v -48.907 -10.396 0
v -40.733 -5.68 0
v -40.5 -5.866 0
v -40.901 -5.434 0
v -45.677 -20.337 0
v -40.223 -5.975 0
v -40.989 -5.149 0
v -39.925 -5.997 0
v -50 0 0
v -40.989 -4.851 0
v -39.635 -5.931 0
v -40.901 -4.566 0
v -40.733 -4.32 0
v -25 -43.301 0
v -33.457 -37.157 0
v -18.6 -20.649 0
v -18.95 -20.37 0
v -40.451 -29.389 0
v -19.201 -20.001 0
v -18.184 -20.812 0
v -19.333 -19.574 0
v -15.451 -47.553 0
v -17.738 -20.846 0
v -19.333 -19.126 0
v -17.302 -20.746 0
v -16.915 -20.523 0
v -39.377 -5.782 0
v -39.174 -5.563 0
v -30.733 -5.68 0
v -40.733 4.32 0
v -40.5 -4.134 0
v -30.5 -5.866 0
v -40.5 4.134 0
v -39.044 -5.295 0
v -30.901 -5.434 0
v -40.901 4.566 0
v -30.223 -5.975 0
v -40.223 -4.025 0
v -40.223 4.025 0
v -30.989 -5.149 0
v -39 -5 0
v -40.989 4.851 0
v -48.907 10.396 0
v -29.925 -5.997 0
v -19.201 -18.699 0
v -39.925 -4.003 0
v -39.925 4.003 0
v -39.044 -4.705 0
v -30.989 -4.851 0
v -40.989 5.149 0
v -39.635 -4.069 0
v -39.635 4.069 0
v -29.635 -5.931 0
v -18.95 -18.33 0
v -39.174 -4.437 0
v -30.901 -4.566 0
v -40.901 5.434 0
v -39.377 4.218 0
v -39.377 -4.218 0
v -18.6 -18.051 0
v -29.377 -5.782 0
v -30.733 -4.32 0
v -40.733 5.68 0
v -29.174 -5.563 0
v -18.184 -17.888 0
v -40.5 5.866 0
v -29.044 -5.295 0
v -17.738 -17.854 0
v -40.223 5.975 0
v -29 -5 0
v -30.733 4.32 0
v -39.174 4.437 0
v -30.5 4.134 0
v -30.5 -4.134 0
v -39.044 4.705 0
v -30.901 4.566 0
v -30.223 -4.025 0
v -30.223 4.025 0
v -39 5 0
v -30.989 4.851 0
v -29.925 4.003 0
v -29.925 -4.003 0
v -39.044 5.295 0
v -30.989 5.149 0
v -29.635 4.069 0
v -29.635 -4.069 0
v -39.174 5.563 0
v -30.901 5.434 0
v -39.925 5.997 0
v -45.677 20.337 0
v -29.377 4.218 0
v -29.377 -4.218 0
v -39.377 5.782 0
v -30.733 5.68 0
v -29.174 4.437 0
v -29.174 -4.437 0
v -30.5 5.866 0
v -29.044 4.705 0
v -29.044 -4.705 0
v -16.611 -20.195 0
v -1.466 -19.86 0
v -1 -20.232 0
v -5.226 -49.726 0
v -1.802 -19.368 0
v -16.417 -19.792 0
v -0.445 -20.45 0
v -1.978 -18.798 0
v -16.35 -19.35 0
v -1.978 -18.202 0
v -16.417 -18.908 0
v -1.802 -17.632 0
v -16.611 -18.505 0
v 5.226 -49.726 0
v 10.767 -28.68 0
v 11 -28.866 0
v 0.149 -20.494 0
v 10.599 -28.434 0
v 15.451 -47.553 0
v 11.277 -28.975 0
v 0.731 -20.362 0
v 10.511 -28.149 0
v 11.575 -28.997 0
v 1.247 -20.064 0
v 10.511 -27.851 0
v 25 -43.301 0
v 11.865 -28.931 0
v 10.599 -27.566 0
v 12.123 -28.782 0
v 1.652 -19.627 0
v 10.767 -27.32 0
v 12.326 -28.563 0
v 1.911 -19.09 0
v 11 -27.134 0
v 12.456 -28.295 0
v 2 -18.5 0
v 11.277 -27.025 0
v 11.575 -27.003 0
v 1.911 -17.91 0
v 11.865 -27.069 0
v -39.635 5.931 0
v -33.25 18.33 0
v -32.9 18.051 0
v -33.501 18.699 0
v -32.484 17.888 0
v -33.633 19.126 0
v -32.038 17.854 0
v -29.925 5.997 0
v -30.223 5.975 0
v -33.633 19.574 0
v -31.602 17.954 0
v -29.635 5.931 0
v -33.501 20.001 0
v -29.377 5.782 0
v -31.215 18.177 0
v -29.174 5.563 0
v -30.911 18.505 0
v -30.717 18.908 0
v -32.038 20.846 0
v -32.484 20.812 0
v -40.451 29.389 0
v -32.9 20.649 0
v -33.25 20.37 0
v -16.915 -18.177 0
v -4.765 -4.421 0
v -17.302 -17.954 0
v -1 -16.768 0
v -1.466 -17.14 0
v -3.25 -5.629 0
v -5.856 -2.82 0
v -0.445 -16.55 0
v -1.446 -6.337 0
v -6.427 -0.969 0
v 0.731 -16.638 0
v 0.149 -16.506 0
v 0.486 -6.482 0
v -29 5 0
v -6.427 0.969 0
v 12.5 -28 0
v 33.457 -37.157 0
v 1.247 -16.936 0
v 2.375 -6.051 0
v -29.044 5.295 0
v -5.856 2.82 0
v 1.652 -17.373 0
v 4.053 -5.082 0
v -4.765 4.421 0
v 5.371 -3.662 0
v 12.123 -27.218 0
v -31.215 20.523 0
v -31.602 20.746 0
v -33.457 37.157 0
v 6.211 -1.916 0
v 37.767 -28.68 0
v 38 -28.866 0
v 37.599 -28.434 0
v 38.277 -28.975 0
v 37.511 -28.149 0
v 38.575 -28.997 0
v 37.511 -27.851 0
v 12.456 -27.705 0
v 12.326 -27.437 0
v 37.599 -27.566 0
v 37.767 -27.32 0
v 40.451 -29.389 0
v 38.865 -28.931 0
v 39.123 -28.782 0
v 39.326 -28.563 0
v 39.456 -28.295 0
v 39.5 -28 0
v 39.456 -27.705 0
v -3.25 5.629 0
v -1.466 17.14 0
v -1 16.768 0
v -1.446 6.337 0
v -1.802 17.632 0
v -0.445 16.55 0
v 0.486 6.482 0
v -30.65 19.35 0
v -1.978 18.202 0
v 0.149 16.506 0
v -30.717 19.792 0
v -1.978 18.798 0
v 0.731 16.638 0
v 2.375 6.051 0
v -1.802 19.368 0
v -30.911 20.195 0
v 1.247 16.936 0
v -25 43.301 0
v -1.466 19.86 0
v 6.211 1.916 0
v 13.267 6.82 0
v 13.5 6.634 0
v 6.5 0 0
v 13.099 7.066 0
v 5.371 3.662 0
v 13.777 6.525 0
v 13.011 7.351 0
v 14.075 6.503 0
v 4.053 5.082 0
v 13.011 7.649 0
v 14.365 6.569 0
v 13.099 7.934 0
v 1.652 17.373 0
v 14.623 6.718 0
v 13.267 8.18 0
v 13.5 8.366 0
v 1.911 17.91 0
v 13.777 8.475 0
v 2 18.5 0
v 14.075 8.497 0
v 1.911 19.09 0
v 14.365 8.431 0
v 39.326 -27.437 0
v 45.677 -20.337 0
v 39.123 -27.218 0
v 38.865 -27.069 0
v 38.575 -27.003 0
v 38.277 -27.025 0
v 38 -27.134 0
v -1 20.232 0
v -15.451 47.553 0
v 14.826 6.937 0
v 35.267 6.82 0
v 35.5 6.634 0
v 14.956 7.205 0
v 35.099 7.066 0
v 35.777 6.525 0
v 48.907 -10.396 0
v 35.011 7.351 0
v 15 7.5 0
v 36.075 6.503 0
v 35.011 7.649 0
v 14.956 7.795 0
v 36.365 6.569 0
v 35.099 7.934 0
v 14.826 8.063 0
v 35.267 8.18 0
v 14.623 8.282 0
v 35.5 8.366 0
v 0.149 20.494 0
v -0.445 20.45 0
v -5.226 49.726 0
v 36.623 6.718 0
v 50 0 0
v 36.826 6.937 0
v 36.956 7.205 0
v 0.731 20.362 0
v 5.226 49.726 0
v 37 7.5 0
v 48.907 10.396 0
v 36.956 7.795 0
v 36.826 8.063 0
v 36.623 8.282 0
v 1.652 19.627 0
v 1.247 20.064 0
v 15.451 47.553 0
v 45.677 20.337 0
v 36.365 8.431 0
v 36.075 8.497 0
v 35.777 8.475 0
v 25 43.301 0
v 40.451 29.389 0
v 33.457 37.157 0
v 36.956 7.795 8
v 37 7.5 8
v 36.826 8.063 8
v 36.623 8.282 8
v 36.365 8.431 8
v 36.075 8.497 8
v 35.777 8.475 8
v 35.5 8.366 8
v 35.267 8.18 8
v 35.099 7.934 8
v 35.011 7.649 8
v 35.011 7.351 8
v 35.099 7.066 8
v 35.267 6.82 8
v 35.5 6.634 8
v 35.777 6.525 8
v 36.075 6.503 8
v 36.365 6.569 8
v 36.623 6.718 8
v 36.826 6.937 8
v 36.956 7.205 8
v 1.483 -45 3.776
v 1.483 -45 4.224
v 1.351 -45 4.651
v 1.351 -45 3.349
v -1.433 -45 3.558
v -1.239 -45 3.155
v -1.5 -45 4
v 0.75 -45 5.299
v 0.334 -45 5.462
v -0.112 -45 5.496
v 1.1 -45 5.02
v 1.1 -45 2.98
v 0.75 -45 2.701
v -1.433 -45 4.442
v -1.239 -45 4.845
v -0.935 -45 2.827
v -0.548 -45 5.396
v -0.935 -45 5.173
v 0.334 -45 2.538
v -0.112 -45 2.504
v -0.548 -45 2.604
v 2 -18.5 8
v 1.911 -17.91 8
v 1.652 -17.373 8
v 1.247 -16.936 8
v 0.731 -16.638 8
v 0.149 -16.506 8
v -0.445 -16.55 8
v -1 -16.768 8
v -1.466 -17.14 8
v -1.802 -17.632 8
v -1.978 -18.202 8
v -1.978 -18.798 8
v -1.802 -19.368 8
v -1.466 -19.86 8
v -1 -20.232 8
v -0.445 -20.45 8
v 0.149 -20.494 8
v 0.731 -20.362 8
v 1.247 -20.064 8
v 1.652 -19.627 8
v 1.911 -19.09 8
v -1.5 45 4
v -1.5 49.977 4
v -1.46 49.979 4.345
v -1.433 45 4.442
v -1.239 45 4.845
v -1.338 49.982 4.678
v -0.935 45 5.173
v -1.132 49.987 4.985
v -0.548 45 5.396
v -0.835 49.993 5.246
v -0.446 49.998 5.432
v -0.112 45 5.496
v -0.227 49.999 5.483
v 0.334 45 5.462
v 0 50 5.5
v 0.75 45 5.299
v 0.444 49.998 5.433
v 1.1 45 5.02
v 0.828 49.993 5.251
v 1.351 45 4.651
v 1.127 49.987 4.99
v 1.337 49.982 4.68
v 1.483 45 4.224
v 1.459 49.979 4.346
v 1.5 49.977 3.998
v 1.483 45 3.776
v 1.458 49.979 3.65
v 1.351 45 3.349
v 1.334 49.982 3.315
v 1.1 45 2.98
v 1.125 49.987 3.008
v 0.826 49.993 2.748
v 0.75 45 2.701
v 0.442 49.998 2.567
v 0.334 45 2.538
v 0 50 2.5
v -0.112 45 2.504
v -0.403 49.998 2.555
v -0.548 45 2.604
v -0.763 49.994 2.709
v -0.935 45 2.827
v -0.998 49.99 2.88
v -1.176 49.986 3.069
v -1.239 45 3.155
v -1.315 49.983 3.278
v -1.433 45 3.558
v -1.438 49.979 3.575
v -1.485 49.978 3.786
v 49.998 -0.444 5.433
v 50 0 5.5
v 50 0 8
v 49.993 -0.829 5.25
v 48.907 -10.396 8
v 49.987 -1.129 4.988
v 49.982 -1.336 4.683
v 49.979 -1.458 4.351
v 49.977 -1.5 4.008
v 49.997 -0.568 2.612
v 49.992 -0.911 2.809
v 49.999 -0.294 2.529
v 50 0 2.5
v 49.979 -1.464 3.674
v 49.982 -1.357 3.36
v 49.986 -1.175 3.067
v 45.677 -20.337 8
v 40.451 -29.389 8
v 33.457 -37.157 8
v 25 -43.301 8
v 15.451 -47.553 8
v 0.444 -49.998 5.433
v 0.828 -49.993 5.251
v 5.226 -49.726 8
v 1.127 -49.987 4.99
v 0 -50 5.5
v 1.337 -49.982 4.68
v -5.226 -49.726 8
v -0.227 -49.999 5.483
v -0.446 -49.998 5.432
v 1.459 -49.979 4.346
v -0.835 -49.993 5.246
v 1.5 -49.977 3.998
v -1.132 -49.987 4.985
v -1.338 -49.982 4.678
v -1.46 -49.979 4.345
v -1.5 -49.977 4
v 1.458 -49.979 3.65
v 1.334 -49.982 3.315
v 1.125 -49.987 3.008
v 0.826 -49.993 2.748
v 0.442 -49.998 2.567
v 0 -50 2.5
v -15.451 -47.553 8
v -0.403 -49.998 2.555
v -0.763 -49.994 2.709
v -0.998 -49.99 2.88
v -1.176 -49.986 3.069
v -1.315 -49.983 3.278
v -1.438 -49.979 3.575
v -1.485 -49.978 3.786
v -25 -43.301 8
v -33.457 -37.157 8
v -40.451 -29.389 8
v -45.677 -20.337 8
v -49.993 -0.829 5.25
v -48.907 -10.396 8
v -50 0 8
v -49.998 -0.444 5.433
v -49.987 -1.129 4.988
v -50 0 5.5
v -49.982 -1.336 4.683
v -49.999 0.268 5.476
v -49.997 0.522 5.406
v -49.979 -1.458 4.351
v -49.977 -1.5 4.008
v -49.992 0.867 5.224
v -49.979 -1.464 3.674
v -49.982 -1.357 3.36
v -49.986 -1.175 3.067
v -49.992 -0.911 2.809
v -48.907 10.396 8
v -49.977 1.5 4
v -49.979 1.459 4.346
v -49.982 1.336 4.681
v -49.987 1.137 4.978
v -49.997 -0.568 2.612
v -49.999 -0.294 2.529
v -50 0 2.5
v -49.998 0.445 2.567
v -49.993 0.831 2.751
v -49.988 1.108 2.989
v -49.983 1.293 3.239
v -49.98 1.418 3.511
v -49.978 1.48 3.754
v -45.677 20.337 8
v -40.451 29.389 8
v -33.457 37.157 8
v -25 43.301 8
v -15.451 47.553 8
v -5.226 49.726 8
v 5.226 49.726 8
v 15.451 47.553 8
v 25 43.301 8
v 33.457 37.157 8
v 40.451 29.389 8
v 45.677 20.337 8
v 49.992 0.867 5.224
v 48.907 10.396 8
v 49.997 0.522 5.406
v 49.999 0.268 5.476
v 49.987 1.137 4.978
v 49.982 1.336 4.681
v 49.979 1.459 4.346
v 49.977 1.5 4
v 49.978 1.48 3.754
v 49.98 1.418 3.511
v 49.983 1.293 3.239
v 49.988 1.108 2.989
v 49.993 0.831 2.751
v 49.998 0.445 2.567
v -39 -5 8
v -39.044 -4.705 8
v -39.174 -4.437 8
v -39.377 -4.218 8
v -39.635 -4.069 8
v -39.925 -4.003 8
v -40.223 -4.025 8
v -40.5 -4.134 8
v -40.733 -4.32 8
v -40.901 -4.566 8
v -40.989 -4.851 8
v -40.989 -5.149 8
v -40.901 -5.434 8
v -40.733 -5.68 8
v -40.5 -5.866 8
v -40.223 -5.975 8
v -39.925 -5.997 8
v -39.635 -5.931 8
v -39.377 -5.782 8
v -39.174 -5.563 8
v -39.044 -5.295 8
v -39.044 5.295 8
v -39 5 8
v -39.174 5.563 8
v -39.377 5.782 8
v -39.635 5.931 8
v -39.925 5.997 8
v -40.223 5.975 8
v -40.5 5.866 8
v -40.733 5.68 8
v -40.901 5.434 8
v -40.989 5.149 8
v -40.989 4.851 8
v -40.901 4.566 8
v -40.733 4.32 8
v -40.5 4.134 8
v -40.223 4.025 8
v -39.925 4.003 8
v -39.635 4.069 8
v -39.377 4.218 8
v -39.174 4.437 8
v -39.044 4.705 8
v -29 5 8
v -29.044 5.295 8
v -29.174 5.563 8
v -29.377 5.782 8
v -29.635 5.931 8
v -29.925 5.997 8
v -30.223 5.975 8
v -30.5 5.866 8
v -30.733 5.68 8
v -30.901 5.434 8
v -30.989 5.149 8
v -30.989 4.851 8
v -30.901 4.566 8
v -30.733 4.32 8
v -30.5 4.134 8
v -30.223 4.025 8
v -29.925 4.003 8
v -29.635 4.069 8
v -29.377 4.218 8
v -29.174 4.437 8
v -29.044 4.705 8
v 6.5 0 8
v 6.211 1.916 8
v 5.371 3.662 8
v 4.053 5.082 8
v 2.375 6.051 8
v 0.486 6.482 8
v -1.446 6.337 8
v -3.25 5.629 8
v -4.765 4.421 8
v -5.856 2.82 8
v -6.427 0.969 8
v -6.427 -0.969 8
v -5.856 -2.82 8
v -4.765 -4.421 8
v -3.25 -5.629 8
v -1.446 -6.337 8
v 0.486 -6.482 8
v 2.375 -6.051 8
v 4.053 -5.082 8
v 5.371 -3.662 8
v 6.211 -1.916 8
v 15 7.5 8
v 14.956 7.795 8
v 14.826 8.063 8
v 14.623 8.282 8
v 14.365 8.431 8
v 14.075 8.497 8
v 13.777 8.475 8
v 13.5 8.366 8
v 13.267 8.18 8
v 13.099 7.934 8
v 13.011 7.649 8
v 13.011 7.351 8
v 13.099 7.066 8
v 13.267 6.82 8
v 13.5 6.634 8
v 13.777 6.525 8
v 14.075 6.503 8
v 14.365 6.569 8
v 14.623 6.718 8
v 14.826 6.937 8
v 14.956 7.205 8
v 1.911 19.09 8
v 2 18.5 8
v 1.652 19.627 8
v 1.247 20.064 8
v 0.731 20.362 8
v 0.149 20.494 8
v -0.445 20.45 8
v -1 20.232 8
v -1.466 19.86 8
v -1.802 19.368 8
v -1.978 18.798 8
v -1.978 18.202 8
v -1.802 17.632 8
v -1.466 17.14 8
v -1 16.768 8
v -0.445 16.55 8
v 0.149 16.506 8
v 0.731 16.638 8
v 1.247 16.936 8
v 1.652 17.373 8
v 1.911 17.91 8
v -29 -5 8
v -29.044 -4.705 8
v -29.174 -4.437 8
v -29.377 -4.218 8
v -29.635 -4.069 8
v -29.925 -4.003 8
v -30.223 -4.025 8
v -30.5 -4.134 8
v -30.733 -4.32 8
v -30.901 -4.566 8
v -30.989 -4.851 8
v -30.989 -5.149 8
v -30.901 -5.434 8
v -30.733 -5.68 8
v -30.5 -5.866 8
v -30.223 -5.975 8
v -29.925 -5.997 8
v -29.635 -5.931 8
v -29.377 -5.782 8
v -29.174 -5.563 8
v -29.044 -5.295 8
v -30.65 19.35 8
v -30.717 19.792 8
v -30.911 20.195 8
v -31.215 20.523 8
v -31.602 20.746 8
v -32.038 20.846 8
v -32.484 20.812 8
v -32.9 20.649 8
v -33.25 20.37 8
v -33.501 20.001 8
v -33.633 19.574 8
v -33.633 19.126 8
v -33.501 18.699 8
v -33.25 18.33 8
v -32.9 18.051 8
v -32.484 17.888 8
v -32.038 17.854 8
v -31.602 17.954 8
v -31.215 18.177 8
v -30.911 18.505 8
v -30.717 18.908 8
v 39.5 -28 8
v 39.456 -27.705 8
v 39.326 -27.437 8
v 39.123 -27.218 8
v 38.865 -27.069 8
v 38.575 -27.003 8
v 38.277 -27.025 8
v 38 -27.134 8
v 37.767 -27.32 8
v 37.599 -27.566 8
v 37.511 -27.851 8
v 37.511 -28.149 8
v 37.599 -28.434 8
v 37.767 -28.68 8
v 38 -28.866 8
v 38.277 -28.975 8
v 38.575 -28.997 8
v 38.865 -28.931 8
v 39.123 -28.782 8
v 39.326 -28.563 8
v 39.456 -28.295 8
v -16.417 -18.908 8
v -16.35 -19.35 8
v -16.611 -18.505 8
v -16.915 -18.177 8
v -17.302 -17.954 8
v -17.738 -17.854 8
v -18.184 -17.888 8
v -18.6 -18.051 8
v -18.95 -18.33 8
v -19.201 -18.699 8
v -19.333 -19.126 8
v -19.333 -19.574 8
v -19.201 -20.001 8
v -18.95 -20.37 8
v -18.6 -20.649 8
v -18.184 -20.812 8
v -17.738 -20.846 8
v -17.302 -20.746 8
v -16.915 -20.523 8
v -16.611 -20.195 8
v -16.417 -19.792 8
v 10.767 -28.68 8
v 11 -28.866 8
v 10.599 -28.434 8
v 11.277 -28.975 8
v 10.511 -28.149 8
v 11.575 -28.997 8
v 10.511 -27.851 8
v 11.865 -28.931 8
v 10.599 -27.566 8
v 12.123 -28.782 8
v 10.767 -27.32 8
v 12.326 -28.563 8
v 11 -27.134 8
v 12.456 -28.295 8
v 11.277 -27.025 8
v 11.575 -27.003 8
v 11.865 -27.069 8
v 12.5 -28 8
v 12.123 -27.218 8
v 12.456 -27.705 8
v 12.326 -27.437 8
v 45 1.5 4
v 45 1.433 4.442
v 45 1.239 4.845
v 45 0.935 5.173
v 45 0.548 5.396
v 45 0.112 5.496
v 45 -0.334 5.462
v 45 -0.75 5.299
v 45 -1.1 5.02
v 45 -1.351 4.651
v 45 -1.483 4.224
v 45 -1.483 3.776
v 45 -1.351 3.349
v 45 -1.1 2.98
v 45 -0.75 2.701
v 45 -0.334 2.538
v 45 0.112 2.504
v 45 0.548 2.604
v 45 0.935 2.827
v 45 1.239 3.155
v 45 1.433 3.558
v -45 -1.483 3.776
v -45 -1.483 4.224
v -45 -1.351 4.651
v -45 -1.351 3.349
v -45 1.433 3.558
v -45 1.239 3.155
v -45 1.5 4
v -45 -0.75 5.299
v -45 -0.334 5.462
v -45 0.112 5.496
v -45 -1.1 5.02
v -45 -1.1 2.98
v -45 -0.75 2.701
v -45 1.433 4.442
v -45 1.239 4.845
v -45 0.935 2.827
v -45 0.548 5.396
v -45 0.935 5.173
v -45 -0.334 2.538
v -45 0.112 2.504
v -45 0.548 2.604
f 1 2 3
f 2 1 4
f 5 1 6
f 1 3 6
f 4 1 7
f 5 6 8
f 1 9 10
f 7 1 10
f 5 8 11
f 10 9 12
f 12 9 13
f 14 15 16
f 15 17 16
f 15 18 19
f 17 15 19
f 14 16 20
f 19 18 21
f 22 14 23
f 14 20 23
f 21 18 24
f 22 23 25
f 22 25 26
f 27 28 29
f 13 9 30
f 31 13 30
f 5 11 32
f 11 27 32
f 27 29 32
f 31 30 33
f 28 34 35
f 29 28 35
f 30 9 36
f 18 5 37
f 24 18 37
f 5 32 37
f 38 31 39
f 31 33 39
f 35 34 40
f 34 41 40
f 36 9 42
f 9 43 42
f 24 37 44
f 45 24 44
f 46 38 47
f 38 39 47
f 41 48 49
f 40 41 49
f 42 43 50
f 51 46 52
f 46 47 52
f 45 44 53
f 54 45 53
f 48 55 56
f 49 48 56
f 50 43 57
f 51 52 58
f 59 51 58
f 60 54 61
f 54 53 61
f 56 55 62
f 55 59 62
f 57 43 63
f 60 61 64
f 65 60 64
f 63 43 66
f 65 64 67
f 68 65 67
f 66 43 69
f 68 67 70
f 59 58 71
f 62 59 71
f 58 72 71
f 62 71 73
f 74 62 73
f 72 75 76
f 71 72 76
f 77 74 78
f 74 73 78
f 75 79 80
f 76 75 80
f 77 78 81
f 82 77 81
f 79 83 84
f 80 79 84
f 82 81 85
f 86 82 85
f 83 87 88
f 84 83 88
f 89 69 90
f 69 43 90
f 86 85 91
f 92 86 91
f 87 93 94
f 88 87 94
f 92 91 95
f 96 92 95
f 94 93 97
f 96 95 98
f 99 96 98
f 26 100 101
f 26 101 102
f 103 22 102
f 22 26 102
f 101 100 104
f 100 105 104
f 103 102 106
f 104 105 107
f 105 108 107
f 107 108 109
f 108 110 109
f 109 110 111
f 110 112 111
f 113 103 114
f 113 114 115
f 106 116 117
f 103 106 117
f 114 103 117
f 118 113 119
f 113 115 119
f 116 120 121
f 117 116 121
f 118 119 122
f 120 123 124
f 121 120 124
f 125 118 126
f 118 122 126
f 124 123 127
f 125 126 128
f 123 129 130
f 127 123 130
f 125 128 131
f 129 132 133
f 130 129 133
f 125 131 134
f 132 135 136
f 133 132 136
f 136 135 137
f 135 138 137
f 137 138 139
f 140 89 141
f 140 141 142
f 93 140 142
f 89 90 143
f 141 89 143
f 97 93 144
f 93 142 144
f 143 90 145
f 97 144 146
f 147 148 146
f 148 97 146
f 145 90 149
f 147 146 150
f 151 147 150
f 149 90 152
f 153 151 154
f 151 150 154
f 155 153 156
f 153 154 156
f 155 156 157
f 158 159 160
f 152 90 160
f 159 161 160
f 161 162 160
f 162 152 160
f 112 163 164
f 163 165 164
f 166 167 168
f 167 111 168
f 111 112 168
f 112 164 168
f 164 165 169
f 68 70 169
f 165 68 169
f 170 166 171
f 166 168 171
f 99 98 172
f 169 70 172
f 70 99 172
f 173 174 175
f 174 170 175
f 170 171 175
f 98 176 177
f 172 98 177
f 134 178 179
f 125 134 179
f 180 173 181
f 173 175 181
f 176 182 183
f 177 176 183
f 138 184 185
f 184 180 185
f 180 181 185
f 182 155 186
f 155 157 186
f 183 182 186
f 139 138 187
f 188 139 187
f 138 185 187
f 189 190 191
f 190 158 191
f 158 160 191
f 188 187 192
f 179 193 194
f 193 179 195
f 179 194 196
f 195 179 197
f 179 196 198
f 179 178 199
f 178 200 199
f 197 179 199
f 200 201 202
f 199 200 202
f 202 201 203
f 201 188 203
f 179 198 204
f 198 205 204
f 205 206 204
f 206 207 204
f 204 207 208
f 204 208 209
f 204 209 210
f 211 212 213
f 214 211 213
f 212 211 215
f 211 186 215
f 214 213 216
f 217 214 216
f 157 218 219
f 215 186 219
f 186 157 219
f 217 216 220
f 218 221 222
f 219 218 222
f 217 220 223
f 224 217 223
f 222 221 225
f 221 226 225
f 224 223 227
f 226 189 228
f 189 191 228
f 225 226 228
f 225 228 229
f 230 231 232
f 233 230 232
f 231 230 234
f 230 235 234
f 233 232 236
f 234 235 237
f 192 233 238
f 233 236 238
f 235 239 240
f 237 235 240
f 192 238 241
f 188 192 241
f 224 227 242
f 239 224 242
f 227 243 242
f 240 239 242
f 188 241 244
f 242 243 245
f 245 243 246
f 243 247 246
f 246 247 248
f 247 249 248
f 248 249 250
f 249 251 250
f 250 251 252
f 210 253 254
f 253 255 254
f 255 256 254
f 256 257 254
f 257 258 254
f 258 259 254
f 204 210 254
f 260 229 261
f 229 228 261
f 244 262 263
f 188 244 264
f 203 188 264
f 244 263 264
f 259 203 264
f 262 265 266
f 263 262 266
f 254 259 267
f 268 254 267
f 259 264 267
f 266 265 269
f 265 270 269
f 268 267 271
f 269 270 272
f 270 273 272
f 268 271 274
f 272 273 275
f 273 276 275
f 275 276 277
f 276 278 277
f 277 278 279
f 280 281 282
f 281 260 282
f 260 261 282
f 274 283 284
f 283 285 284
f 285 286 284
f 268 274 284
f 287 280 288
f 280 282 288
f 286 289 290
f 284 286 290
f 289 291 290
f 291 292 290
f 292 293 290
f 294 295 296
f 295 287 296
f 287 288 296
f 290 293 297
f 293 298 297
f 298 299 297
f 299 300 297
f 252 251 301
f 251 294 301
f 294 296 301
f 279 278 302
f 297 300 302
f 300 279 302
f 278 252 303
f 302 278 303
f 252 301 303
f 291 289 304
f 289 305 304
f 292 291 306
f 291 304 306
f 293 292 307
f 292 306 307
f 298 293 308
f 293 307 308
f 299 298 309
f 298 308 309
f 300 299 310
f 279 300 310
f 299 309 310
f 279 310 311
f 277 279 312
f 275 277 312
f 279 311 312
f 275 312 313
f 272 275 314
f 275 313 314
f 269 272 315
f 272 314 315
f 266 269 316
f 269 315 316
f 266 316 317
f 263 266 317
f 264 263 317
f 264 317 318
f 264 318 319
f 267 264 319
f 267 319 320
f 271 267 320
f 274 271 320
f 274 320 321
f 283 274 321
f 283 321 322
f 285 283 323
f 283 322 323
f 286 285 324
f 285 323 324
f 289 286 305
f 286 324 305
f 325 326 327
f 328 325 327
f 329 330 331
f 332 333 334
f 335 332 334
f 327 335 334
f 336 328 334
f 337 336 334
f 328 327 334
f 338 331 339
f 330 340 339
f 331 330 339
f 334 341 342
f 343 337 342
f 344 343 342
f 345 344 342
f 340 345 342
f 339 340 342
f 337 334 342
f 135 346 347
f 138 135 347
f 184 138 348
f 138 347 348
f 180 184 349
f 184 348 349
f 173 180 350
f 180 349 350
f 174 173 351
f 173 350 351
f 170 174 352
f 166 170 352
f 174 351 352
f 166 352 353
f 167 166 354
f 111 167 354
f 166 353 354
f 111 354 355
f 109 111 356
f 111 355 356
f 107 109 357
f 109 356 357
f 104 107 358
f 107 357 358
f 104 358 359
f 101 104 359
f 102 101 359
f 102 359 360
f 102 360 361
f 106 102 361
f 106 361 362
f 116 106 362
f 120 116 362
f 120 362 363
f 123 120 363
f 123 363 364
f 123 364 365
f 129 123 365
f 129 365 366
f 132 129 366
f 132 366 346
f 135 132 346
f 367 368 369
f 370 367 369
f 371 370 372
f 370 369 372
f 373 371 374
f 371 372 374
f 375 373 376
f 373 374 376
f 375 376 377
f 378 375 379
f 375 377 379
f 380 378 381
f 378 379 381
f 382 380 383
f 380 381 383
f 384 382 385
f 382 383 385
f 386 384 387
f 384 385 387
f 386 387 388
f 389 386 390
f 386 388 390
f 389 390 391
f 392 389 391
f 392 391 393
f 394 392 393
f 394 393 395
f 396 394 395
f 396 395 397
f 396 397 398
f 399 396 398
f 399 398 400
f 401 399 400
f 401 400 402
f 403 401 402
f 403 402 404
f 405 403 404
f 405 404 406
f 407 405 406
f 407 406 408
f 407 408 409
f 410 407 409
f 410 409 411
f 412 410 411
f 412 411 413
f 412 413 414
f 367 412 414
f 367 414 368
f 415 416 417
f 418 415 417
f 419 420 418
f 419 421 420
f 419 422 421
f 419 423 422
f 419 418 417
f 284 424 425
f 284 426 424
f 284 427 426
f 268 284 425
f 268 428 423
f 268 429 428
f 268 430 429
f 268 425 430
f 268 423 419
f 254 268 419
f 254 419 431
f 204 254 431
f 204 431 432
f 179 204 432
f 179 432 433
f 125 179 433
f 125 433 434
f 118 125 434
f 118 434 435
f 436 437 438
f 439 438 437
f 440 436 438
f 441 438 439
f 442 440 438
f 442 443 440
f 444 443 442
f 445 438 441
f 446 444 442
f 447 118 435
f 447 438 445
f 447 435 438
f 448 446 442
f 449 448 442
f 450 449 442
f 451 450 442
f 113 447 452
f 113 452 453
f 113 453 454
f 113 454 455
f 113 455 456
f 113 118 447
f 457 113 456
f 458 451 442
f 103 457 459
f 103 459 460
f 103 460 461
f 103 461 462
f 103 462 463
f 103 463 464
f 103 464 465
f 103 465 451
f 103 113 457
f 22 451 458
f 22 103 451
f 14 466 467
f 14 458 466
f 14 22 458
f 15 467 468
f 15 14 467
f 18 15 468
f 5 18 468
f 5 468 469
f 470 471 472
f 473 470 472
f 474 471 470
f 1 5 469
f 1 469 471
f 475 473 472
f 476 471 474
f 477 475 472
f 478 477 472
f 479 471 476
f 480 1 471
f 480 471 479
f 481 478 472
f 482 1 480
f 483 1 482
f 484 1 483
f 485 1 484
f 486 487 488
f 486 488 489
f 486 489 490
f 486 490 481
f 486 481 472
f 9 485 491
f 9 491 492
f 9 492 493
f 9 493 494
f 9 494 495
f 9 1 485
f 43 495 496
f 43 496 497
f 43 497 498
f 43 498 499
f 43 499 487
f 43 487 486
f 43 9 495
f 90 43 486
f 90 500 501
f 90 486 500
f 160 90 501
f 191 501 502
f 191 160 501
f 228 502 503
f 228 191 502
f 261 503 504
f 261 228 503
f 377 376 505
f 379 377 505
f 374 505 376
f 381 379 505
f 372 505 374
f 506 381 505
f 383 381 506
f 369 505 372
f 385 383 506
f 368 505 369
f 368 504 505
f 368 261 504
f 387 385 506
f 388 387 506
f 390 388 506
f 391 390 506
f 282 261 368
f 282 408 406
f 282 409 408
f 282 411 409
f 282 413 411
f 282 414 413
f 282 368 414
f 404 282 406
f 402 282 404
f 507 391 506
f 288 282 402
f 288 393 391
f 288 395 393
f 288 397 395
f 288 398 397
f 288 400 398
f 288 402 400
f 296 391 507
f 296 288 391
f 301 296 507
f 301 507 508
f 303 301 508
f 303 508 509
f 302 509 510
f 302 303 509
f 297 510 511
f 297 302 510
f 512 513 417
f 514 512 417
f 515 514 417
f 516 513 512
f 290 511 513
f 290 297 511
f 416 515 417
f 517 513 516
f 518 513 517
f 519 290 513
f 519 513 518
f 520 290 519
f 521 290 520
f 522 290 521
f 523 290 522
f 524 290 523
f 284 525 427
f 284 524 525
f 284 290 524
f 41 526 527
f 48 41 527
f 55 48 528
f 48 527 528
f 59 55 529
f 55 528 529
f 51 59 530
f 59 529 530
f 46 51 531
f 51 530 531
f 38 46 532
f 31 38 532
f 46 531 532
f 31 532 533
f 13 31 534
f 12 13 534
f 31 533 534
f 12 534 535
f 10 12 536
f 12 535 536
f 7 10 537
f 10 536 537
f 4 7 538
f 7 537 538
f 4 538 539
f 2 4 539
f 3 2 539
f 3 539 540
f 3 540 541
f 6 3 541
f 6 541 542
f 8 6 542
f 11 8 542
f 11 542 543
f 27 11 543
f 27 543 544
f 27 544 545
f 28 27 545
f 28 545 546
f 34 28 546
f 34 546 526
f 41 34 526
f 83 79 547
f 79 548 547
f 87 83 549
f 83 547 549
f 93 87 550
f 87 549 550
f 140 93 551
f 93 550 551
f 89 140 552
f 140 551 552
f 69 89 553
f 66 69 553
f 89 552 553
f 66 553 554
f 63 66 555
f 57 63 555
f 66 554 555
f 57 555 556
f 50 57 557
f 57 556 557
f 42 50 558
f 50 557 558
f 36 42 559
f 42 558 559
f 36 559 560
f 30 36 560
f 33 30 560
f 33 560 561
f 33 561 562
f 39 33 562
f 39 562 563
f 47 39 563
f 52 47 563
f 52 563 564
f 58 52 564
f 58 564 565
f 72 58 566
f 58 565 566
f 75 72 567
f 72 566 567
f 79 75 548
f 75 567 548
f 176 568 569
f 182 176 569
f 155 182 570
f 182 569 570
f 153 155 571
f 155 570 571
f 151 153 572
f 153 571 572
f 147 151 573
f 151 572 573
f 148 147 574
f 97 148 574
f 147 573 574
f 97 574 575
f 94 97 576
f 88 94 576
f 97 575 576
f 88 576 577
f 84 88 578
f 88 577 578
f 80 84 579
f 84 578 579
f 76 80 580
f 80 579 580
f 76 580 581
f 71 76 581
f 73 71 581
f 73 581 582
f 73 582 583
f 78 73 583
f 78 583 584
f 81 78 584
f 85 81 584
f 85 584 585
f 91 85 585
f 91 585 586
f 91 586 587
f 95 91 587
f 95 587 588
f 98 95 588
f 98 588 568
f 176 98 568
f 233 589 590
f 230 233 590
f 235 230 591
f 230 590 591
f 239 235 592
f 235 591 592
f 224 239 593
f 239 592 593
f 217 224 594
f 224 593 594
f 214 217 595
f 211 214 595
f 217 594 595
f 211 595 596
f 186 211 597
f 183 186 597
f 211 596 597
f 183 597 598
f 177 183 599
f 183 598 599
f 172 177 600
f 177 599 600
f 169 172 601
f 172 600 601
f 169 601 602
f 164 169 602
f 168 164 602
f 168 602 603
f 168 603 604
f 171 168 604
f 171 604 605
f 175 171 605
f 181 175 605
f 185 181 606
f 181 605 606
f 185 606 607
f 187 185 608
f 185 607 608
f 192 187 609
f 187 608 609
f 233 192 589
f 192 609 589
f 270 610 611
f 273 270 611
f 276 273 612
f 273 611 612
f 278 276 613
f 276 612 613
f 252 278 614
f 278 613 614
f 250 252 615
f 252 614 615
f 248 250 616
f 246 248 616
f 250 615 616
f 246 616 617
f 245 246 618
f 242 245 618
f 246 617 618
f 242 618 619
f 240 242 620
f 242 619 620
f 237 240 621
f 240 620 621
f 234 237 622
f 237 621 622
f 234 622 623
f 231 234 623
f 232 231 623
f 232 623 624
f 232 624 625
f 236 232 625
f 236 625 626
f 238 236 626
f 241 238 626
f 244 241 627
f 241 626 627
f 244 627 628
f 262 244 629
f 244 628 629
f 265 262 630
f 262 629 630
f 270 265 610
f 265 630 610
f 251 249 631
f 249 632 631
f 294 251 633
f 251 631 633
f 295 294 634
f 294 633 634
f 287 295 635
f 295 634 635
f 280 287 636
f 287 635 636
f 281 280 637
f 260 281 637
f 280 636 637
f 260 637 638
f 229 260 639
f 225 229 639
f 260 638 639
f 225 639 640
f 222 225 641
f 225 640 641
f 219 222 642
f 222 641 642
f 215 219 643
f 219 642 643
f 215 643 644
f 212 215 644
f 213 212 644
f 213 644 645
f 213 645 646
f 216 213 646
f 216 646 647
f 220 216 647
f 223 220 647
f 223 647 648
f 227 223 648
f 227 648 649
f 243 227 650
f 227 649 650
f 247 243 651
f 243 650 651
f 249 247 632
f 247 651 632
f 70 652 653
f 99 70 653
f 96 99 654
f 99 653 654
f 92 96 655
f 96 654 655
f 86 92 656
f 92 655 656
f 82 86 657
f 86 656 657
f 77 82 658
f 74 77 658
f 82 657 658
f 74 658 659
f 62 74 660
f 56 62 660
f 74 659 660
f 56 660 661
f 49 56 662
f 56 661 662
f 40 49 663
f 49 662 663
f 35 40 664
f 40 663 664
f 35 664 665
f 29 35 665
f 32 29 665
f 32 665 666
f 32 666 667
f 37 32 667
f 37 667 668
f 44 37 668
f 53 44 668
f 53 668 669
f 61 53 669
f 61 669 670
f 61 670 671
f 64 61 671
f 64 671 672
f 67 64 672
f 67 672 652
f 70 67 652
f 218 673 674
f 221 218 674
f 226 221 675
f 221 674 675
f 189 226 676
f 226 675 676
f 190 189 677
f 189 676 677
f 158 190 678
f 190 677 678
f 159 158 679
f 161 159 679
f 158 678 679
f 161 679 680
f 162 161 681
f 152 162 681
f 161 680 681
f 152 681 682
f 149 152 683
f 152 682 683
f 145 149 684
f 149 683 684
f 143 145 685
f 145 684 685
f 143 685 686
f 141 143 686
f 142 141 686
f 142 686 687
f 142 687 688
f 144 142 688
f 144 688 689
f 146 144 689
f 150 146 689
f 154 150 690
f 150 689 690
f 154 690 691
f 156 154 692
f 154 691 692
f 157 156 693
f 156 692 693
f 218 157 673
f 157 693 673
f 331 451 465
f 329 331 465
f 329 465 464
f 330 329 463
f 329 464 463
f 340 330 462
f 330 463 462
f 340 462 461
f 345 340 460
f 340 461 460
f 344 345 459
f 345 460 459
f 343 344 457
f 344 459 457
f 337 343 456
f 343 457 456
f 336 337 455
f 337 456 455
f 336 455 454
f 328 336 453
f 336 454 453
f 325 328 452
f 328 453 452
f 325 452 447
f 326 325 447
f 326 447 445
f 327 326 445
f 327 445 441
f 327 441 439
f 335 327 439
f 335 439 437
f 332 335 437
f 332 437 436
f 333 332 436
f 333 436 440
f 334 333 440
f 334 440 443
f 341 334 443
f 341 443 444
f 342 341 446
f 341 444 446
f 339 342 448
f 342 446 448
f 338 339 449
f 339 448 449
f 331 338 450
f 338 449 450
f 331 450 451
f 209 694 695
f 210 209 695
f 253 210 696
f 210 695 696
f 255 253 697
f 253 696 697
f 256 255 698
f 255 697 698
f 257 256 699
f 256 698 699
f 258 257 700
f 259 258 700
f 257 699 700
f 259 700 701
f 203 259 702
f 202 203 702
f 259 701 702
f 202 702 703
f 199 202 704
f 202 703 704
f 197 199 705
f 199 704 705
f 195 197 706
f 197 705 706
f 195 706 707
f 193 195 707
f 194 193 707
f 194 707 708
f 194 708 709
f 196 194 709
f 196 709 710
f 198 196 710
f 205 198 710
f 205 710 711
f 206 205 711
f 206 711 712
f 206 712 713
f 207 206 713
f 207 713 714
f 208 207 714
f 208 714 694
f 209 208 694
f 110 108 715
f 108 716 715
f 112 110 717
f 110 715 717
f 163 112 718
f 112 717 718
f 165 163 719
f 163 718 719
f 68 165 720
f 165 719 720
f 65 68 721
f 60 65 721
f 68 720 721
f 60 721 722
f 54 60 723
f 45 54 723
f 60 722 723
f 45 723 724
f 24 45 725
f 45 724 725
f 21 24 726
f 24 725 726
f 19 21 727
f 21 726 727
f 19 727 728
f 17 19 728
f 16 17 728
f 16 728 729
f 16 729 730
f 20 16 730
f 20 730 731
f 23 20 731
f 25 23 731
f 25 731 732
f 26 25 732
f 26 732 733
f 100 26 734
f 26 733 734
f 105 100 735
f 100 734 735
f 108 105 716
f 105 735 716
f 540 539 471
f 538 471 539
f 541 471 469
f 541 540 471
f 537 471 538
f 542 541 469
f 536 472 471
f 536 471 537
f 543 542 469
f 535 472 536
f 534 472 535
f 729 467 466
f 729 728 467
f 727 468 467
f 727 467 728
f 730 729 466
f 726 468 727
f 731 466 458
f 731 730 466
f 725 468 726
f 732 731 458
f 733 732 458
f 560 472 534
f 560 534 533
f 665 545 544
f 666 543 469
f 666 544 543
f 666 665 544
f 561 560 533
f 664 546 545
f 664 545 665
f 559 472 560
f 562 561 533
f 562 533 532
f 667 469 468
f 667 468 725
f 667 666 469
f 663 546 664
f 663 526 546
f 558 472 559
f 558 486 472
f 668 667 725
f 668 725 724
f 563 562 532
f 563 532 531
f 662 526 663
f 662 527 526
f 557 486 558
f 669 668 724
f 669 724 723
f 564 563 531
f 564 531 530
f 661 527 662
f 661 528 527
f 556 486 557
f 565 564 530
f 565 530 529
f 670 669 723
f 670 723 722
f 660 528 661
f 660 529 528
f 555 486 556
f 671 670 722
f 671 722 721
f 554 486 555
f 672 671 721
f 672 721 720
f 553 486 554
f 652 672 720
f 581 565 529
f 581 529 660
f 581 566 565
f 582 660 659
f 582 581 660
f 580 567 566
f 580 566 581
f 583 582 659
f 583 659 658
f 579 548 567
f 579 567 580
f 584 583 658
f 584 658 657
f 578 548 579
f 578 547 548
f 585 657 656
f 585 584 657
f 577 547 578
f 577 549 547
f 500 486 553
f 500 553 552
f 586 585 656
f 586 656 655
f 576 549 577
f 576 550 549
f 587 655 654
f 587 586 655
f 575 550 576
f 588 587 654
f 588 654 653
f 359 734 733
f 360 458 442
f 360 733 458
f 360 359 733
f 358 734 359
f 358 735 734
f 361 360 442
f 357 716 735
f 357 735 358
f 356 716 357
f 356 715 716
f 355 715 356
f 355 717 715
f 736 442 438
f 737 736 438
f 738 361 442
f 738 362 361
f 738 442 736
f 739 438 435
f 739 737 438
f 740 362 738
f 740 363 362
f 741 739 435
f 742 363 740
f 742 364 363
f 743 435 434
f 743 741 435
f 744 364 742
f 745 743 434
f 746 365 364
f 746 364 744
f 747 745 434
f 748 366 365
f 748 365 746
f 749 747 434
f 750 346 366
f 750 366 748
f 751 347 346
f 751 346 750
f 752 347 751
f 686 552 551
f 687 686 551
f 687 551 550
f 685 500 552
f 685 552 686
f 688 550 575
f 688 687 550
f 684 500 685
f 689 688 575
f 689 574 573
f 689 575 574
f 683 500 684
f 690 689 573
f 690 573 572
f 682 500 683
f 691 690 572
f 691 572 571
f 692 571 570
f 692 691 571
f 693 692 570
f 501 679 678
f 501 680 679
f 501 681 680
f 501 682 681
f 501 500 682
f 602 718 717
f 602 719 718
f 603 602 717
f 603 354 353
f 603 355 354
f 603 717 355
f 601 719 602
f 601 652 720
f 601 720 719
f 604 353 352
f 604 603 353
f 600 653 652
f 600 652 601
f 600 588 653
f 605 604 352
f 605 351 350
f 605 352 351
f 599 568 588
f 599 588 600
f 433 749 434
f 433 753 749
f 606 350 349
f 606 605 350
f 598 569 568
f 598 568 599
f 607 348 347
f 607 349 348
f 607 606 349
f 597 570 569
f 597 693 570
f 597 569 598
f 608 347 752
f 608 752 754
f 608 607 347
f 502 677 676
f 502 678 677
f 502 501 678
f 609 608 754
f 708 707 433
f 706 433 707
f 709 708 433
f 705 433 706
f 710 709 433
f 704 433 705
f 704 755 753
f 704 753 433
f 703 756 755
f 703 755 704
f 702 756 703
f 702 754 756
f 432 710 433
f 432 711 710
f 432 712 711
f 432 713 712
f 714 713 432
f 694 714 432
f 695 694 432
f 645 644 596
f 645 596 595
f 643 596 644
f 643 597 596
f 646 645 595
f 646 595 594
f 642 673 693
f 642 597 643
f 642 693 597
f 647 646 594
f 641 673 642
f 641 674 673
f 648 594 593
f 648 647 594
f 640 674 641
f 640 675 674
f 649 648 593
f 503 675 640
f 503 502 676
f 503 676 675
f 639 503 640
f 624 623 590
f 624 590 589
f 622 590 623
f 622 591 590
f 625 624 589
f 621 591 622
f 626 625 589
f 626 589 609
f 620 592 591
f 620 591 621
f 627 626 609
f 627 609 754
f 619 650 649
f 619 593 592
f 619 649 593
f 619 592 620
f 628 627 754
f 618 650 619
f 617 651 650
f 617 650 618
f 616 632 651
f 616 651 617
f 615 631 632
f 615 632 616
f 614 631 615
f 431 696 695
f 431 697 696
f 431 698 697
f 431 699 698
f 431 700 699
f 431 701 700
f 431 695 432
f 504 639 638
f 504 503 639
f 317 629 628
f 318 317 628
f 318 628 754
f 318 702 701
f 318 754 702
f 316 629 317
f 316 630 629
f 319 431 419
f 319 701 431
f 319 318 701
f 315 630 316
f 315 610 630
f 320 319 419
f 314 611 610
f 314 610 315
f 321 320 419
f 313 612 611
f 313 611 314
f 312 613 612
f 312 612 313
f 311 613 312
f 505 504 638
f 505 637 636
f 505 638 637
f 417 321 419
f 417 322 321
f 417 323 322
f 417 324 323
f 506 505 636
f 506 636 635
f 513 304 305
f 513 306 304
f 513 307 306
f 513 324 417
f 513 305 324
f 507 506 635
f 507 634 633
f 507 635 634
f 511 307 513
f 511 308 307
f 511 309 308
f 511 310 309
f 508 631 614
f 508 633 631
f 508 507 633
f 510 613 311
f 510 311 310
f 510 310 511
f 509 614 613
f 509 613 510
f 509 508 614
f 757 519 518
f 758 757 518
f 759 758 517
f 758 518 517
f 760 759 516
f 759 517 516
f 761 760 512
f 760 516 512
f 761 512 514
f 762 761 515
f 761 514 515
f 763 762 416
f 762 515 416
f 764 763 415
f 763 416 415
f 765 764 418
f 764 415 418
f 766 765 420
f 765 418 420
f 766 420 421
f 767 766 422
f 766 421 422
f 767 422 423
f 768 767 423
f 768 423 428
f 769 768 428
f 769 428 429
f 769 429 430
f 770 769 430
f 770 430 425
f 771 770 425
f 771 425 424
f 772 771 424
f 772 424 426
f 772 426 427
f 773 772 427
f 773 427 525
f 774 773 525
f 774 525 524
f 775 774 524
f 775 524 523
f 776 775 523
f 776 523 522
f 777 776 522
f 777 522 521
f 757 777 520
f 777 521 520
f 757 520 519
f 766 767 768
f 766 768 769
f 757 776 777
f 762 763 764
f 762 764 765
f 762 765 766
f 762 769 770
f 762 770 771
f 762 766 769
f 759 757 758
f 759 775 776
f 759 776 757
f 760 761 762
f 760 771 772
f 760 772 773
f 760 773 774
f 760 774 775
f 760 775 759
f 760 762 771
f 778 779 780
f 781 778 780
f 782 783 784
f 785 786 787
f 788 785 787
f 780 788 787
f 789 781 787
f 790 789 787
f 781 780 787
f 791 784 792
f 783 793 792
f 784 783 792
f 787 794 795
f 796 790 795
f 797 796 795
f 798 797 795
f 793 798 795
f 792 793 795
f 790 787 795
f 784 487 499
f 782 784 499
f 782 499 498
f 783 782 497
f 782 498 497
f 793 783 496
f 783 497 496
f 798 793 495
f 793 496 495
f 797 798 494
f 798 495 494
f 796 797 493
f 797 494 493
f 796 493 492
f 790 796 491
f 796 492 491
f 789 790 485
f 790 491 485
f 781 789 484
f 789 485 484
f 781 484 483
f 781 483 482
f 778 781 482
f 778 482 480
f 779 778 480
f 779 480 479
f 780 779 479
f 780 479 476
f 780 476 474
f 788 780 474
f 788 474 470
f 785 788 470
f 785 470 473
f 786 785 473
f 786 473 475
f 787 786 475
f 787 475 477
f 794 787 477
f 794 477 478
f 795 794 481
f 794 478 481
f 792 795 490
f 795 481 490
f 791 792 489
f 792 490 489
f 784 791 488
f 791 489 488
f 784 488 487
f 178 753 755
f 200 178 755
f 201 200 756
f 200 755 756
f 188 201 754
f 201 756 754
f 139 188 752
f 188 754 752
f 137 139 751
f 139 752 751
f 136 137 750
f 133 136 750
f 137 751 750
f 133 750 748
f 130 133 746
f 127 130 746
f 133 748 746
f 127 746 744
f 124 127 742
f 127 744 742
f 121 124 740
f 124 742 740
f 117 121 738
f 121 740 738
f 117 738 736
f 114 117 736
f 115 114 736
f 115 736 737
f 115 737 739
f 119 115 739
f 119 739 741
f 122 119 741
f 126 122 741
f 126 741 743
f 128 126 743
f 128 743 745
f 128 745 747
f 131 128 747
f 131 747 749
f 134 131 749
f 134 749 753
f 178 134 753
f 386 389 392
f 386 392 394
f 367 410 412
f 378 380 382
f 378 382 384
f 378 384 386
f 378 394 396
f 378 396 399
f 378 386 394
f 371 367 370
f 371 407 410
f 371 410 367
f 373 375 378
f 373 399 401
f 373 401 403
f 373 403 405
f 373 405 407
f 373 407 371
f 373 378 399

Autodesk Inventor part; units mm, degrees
sketch "スケッチ1" plane through (0, 0, 0) normal (0, 0, 1) x (1, 0, 0)
  circle A0 centre (0, 0) radius 50
  dimension "d0" = 100
extrude "押し出し1" add sketch "スケッチ1" along normal blind 8
ref_plane "作業平面1" through (50, 0, 0) normal (1, 0, 0) x (0, 1, 0)
ref_plane "作業平面2" through (-50, 0, 0) normal (1, 0, 0) x (0, 1, 0)
ref_plane "作業平面3" through (0, 50, 0) normal (0, 1, 0) x (-1, 0, 0)
ref_plane "作業平面4" through (0, -50, 0) normal (0, 1, 0) x (-1, 0, 0)
sketch "スケッチ2" plane through (50, 0, 0) normal (1, 0, 0) x (0, 1, 0)
  line L0 (0, 0) -> (0, 4) construction
  circle A0 centre (0, 4) radius 1.5
  dimension "d7" = 4
  dimension "d8" = 3
extrude "押し出し2" cut sketch "スケッチ2" against normal blind 5
sketch "スケッチ3" plane through (-50, 0, 0) normal (1, 0, 0) x (0, 1, 0)
  line L0 (0, 0) -> (0, 4) construction
  circle A0 centre (0, 4) radius 1.5
  dimension "d11" = 4
  dimension "d12" = 3
extrude "押し出し3" cut sketch "スケッチ3" along normal blind 5
sketch "スケッチ4" plane through (0, 50, 0) normal (0, 1, 0) x (-1, 0, 0)
  line L0 (0, 0) -> (0, 4) construction
  circle A0 centre (0, 4) radius 1.5
  dimension "d15" = 4
  dimension "d16" = 3
extrude "押し出し4" cut sketch "スケッチ4" against normal blind 5
sketch "スケッチ5" plane through (0, -50, 0) normal (0, 1, 0) x (-1, 0, 0)
  line L0 (0, 0) -> (0, 4) construction
  circle A0 centre (0, 4) radius 1.5
  dimension "d19" = 4
  dimension "d20" = 3
extrude "押し出し5" cut sketch "スケッチ5" along normal blind 5
thread "ねじ1" size "M3x0.5" class "6H" standard "ANSI Metric M Profile" full length
thread "ねじ2" size "M3x0.5" class "6H" standard "ANSI Metric M Profile" full length
thread "ねじ3" size "M3x0.5" class "6H" standard "ANSI Metric M Profile" full length
thread "ねじ4" size "M3x0.5" class "6H" standard "ANSI Metric M Profile" full length
sketch "スケッチ8" plane through (0, 0, 8) normal (0, 0, 1) x (1, 0, 0)
  line L0 (0, 0) -> (0, 18.5) construction
  line L1 (0, 0) -> (0, -18.5) construction
  circle A0 centre (0, 18.5) radius 2
  circle A1 centre (0, -18.5) radius 2
  circle A2 centre (0, 0) radius 6.5
  dimension "d62" = 18.5
  dimension "d63" = 18.5
  dimension "d64" = 4
  dimension "d65" = 4
  dimension "d66" = 13
extrude "押し出し7" cut sketch "スケッチ8" against normal blind 8
thread "ねじ7" size "M4x0.7" class "6H" standard "ANSI Metric M Profile" full length
thread "ねじ8" size "M4x0.7" class "6H" standard "ANSI Metric M Profile" full length
sketch "スケッチ9" plane through (0, 0, 8) normal (0, 0, 1) x (1, 0, 0)
  line L0 (0, 0) -> (25, 0) construction
  line L1 (25, 0) -> (25, -1) construction
  line L2 (25, 0) -> (25, 7.5) construction
  circle A0 centre (36, 7.5) radius 1
  line L3 (36, 7.5) -> (14, 7.5) construction
  circle A1 centre (14, 7.5) radius 1
  line L4 (25, -1) -> (25, -10) construction
  line L5 (25, -10) -> (25, -28) construction
  circle A2 centre (11.5, -28) radius 1
  line L6 (25, 0) -> (9, 0) construction
  line L7 (9, 0) -> (9, -31) construction
  line L8 (9, -31) -> (41, -31) construction
  line L9 (41, -31) -> (41, 0) construction
  line L10 (25, 0) -> (25, 12) construction
  line L11 (14.417, 12) -> (35.583, 12) construction
  arc A3 (14.757, 12.2915) -> (9, 0) centre (25, 0) ccw construction
  arc A4 (41, 0) -> (35.583, 12) centre (25, 0) ccw construction
  line L12 (11.5, -28) -> (38.5, -28) construction
  circle A5 centre (38.5, -28) radius 1
  dimension "d92" = 25
  dimension "d103" = 7.5
  dimension "d105" = 2
  dimension "d108" = 2
  dimension "d117" = 2
  dimension "d129" = 16
  dimension "d130" = 31
  dimension "d131" = 32
  dimension "d134" = 22
  dimension "d146" = 28
  dimension "d147" = 27
  dimension "d148" = 2
sketch "スケッチ10" plane through (0, 0, 8) normal (0, 0, 1) x (1, 0, 0)
  line L0 (0, 0) -> (-25, 0) construction
  line L1 (-35.65, 22.85) -> (-14.35, 22.85) construction
  line L2 (-14.35, 22.85) -> (-14.35, -22.85) construction
  line L3 (-14.35, -22.85) -> (-35.65, -22.85) construction
  line L4 (-35.65, -22.85) -> (-35.65, 22.85) construction
  line L5 (-35.65, 22.85) -> (-14.35, -22.85) construction
  line L6 (-14.35, 22.85) -> (-35.65, -22.85) construction
  line L7 (-35.65, 22.85) -> (-32.15, 22.85) construction
  line L8 (-32.15, 22.85) -> (-32.15, 19.35) construction
  line L9 (-32.15, 19.35) -> (-35.65, 19.35) construction
  line L10 (-35.65, 19.35) -> (-35.65, 22.85) construction
  line L11 (-14.35, -22.85) -> (-17.85, -22.85) construction
  line L12 (-17.85, -22.85) -> (-17.85, -19.35) construction
  line L13 (-17.85, -19.35) -> (-14.35, -19.35) construction
  line L14 (-14.35, -19.35) -> (-14.35, -22.85) construction
  circle A0 centre (-32.15, 19.35) radius 1.5
  circle A1 centre (-17.85, -19.35) radius 1.5
  dimension "d135" = 25
  dimension "d136" = 21.3
  dimension "d137" = 45.7
  dimension "d138" = 3.5
  dimension "d139" = 3.5
  dimension "d140" = 3.5
  dimension "d141" = 3.5
  dimension "d142" = 3
  dimension "d143" = 3
extrude "押し出し10" cut sketch "スケッチ10" against normal blind 8
extrude "押し出し11" cut sketch "スケッチ9" against normal blind 8
sketch "スケッチ13" plane through (0, 0, 8) normal (0, 0, 1) x (1, 0, 0)
  line L0 (0, 0) -> (-35, 0) construction
  line L1 (-40, 5) -> (-30, 5) construction
  line L2 (-30, 5) -> (-30, -5) construction
  line L3 (-30, -5) -> (-40, -5) construction
  line L4 (-40, -5) -> (-40, 5) construction
  line L5 (-40, 5) -> (-30, -5) construction
  line L6 (-30, 5) -> (-40, -5) construction
  circle A0 centre (-30, 5) radius 1
  circle A1 centre (-30, -5) radius 1
  circle A2 centre (-40, 5) radius 1
  circle A3 centre (-40, -5) radius 1
  dimension "d151" = 35
  dimension "d152" = 10
  dimension "d153" = 10
  dimension "d154" = 2
  dimension "d155" = 2
  dimension "d156" = 2
  dimension "d157" = 2
extrude "押し出し12" cut sketch "スケッチ13" against normal blind 8
properties part number "outsideCover"
